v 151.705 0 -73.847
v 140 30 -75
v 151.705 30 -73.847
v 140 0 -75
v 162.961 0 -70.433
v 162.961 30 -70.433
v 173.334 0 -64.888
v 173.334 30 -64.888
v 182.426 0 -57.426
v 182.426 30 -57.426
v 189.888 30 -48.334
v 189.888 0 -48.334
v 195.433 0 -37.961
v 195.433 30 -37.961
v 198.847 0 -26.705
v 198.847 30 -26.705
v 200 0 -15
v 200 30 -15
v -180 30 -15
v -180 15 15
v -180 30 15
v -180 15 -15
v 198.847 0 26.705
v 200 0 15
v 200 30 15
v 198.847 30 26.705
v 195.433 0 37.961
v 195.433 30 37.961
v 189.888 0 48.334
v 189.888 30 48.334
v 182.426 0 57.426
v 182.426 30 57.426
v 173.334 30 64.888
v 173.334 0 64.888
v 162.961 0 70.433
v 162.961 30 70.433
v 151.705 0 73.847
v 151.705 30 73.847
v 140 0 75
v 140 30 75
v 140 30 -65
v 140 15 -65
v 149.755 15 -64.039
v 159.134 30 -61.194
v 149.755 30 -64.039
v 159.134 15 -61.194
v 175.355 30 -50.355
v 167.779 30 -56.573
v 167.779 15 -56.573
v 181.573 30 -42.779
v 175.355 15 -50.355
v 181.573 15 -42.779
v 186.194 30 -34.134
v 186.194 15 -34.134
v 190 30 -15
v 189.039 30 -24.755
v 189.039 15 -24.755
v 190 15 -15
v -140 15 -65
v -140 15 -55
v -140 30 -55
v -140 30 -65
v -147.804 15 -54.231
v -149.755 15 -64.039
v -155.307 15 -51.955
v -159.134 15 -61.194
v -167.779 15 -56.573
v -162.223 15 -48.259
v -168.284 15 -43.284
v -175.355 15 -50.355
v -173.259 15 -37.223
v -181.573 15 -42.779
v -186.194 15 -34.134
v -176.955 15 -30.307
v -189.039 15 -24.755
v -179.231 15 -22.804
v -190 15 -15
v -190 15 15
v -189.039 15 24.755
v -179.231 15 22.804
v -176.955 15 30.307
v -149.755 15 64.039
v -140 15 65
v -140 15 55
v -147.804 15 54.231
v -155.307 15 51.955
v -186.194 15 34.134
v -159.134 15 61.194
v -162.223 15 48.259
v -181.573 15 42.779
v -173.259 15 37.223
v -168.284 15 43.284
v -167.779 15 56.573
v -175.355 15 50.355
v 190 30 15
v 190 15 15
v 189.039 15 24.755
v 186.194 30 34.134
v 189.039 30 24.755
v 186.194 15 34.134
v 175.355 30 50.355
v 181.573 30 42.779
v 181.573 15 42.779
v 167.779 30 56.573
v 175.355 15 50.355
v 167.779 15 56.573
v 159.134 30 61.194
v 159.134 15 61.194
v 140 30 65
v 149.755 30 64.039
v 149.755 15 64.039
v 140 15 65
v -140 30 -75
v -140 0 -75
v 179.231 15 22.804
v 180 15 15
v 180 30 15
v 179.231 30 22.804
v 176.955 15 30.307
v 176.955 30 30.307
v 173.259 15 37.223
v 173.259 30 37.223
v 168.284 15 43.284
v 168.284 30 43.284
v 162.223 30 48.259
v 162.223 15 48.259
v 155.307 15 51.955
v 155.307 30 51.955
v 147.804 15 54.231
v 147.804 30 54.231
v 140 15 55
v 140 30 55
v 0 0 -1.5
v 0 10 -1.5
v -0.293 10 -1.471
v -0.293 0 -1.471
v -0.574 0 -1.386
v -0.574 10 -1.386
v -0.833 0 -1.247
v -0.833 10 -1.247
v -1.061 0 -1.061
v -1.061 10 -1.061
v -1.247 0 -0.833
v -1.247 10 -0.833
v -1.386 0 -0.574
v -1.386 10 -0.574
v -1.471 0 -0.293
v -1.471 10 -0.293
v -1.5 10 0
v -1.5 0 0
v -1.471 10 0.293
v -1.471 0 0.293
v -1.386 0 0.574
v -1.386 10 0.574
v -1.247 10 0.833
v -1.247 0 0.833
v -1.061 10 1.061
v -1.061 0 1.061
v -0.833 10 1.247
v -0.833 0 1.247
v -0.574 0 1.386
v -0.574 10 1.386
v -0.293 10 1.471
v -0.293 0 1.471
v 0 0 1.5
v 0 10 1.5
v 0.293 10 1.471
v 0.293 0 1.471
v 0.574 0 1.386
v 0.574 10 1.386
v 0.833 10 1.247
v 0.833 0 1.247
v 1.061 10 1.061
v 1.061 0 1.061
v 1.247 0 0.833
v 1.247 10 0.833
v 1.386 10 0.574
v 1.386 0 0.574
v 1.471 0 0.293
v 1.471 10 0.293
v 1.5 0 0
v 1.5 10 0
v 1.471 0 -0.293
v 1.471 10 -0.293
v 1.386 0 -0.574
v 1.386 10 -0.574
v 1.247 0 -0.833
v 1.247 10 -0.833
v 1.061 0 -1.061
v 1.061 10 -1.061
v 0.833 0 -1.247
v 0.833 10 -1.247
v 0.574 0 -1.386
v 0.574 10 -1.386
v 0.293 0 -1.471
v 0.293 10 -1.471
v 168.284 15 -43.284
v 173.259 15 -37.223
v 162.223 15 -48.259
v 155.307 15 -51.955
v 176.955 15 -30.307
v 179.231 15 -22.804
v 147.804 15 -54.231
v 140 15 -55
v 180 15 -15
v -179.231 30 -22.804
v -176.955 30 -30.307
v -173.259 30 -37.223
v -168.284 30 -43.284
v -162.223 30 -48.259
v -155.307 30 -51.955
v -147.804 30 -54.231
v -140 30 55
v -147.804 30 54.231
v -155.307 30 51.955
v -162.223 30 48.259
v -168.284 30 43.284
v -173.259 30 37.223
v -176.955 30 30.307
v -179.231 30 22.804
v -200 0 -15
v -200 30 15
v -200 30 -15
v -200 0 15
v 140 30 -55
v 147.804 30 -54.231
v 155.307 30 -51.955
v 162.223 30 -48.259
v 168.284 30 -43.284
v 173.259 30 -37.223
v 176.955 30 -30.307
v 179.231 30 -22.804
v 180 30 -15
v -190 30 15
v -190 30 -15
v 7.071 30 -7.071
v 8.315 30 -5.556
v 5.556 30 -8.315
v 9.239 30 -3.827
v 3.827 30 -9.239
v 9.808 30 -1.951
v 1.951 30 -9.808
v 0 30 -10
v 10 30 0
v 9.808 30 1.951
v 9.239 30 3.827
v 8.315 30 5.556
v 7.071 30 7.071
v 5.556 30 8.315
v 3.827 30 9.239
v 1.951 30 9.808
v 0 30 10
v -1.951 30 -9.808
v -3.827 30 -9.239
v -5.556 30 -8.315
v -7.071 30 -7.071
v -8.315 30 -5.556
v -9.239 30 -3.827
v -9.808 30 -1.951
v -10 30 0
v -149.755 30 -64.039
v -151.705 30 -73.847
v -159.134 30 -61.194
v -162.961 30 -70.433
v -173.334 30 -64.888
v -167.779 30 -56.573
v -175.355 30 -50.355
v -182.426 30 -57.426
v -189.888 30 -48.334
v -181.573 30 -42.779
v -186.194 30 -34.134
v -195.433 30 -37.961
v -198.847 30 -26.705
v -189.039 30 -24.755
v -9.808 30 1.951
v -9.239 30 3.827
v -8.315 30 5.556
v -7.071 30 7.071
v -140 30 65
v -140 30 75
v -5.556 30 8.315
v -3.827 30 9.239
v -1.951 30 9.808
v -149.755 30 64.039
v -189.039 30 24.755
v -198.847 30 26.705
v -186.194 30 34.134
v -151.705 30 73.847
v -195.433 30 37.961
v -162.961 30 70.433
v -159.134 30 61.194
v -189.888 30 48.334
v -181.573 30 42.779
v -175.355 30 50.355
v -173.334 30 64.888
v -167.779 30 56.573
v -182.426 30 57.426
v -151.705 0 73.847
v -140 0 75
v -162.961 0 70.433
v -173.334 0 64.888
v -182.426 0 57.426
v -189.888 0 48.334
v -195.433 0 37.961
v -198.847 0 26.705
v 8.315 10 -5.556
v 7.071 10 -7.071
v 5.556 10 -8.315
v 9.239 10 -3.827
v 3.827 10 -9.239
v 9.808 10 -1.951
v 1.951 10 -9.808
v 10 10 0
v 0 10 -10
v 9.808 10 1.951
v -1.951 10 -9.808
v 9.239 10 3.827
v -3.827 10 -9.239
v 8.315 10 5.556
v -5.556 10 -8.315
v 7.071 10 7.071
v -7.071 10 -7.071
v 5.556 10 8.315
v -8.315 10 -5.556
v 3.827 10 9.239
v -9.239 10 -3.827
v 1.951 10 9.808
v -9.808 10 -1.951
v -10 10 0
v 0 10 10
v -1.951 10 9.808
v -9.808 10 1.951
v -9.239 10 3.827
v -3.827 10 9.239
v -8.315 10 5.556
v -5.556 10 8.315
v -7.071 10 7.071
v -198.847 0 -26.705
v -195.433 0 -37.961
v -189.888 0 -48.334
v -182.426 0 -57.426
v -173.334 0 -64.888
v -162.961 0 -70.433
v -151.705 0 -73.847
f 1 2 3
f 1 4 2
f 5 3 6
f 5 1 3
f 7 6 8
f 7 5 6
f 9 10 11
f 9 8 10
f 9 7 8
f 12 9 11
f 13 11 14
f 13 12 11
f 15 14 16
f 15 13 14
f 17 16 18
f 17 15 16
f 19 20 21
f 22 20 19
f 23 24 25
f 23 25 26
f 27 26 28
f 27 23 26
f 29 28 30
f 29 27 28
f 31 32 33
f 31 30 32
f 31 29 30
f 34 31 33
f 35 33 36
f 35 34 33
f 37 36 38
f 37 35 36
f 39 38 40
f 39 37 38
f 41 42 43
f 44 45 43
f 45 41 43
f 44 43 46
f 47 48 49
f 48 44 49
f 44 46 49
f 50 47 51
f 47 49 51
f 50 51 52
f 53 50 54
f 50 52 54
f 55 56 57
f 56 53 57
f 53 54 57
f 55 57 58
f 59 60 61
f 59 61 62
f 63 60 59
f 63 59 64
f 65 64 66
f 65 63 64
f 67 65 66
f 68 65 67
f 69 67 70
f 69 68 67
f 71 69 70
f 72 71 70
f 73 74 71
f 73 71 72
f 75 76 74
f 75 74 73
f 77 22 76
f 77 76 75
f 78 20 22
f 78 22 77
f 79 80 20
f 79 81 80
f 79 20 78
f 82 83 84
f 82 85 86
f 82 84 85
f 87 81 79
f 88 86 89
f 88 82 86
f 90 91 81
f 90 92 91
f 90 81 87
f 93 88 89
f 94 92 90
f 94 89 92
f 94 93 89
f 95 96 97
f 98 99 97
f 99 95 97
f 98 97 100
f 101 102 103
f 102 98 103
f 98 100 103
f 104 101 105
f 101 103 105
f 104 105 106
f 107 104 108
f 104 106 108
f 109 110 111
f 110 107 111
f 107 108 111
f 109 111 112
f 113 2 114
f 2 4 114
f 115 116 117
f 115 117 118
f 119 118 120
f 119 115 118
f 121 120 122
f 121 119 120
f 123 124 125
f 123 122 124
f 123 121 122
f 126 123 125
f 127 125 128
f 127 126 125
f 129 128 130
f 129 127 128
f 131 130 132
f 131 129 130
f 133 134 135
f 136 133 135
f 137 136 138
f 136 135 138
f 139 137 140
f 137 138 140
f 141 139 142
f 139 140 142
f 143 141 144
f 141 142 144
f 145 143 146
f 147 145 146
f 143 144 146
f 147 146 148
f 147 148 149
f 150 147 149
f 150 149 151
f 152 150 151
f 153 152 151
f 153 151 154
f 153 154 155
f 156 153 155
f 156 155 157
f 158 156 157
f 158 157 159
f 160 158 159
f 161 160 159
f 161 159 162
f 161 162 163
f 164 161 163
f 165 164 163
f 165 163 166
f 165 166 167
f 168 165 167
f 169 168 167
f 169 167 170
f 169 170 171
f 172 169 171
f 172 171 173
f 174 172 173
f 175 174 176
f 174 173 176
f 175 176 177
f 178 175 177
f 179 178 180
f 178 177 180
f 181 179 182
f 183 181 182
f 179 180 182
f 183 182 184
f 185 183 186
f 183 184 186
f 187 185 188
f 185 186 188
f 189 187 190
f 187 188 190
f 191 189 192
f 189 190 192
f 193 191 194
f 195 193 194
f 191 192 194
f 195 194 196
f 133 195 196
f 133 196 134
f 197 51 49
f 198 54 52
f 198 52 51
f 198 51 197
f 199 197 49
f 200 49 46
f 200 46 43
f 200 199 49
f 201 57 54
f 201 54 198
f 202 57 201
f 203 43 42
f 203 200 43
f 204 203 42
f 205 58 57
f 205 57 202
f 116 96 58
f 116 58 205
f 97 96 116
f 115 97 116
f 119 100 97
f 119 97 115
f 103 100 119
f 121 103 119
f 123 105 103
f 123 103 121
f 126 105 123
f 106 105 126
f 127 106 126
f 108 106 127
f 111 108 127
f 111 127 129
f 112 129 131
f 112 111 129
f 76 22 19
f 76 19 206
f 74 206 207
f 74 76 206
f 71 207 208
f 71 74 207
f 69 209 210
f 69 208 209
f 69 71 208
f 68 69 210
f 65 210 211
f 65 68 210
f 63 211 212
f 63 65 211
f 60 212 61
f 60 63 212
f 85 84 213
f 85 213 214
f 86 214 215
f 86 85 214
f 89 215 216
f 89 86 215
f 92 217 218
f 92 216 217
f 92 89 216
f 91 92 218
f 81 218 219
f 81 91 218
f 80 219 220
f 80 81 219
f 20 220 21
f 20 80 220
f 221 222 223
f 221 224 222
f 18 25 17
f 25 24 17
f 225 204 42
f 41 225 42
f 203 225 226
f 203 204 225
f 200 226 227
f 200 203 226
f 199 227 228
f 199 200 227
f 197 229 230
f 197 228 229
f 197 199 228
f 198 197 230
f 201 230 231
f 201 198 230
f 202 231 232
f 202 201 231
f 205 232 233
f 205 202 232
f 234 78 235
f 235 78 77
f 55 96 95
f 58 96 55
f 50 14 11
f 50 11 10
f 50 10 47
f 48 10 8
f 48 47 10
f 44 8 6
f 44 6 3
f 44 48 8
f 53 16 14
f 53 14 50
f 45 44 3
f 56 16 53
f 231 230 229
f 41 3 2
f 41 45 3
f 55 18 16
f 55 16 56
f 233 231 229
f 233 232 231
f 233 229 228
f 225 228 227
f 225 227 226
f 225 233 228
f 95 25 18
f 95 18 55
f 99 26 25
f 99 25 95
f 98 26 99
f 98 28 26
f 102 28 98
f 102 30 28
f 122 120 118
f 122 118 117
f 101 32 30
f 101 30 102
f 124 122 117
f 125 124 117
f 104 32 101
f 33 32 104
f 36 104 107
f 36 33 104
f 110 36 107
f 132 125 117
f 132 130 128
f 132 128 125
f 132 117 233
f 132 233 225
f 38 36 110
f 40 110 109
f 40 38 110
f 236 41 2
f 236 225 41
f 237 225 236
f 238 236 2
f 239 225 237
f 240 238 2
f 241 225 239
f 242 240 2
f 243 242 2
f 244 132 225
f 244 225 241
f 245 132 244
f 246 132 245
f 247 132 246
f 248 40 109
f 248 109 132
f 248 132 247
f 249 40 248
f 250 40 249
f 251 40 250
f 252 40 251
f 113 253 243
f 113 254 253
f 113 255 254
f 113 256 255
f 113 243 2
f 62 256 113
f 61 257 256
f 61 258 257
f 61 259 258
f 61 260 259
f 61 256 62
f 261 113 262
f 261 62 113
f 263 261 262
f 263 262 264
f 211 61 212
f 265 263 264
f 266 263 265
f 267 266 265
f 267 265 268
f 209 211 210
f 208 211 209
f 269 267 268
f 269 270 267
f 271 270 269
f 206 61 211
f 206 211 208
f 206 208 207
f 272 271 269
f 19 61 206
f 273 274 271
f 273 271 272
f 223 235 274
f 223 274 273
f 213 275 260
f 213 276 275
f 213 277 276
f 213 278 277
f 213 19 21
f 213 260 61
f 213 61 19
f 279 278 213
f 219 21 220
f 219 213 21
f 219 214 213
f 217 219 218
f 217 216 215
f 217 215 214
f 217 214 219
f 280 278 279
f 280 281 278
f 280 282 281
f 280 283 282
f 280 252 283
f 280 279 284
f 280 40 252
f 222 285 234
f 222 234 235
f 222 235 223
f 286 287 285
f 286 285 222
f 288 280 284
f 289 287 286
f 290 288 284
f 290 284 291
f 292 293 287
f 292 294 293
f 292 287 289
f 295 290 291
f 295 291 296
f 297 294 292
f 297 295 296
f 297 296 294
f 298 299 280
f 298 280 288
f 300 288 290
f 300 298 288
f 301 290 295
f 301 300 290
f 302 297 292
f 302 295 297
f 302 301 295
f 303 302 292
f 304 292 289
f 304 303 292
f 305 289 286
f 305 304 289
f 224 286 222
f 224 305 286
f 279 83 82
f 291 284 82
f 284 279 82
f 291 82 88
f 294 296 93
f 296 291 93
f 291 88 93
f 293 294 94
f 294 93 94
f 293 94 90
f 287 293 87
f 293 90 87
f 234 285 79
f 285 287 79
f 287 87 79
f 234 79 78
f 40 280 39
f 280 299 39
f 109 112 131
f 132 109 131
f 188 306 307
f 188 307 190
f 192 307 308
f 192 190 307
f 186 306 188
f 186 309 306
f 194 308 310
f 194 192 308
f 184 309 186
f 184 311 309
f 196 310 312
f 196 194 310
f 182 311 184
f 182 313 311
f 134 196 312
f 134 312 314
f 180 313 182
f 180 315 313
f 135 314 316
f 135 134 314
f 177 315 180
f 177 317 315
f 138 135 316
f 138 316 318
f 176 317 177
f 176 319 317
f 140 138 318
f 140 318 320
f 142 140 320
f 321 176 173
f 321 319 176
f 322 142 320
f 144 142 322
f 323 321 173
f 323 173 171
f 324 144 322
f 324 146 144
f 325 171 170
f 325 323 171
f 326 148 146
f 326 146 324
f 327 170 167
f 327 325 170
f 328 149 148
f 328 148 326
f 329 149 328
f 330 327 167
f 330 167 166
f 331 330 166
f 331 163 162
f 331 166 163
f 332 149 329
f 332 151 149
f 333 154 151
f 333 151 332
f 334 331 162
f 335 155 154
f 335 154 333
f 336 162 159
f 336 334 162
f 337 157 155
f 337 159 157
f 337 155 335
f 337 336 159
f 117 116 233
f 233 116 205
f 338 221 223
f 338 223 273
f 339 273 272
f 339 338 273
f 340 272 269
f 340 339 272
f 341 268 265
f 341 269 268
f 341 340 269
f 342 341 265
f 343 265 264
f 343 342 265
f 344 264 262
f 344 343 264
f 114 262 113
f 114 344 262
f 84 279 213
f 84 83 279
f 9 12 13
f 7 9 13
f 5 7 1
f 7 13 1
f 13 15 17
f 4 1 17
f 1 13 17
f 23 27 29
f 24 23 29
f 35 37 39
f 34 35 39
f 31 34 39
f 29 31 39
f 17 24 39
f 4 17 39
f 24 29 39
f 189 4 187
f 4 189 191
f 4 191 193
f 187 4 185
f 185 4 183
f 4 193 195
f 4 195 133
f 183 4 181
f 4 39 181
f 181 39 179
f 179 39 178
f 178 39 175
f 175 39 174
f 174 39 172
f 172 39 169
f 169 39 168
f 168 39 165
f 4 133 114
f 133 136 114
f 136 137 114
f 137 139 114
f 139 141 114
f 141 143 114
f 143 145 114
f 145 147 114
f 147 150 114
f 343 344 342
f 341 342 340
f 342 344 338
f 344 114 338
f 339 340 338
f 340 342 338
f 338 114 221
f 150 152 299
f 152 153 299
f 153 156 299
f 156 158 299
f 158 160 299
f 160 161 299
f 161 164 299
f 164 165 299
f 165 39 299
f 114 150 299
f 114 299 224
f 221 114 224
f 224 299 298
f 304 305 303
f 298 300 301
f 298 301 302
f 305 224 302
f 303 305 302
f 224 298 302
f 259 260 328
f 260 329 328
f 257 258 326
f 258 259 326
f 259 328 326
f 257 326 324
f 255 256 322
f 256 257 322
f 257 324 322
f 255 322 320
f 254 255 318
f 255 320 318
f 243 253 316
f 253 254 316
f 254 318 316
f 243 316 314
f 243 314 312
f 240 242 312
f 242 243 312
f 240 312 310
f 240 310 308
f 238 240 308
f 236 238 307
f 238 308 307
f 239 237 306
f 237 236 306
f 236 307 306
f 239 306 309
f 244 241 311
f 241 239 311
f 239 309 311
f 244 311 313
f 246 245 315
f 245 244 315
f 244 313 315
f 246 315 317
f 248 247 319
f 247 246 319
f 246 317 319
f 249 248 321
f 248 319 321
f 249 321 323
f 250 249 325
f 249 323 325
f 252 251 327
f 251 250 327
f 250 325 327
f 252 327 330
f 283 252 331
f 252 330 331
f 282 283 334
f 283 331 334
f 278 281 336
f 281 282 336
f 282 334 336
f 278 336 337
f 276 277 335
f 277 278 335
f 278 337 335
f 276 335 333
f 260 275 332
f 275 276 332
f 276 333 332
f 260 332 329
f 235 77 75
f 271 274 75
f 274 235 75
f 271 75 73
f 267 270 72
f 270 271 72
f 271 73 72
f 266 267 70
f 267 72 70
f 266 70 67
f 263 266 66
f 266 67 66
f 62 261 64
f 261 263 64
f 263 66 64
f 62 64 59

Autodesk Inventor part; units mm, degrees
ref_plane "YZ Plane" through (0, 0, 0) normal (1, 0, 0) x (0, 1, 0)
ref_plane "XZ Plane" through (0, 0, 0) normal (0, 1, 0) x (-1, 0, 0)
ref_plane "XY Plane" through (0, 0, 0) normal (0, 0, 1) x (1, 0, 0)
sketch "Boceto1" plane through (0, 0, 0) normal (0, 1, 0) x (-1, 0, 0)
  line L0 (140, 75) -> (-140, 75)
  line L1 (-200, 15) -> (-200, -15)
  line L2 (-140, -75) -> (140, -75)
  arc A0 (-140, 75) -> (-200, 15) centre (-140, 15) ccw
  arc A1 (-200, -15) -> (-140, -75) centre (-140, -15) ccw
  line L3 (-140, 65) -> (-140, 55)
  line L4 (-140, -55) -> (-140, -65)
  arc A2 (-140, 65) -> (-190, 15) centre (-140, 15) ccw
  line L5 (-190, 15) -> (-190, -15)
  arc A3 (-190, -15) -> (-140, -65) centre (-140, -15) ccw
  arc A4 (-140, 55) -> (-180, 15) centre (-140, 15) ccw
  line L6 (-180, 15) -> (-180, -15)
  arc A5 (-180, -15) -> (-140, -55) centre (-140, -15) ccw
  line L7 (140, 65) -> (140, 55)
  line L8 (140, -55) -> (140, -65)
  arc A6 (190, 15) -> (140, 65) centre (140, 15) ccw
  line L9 (190, 15) -> (190, -15)
  arc A7 (140, -65) -> (190, -15) centre (140, -15) ccw
  arc A8 (180, 15) -> (140, 55) centre (140, 15) ccw
  line L10 (180, 15) -> (180, -15)
  arc A9 (140, -55) -> (180, -15) centre (140, -15) ccw
  line L11 (200, 15) -> (200, -15)
  arc A10 (200, 15) -> (140, 75) centre (140, 15) ccw
  arc A11 (140, -75) -> (200, -15) centre (140, -15) ccw
  circle A12 centre (0, 0) radius 10
  dimension "d32" = 400
  dimension "d33" = 150
extrude "Extrusión1" add sketch "Boceto1" along normal blind 15 contours A6 L9 A7 L8 A9 L10 A8 L7
extrude "Extrusión2" add sketch "Boceto1" along normal blind 15 contours L3 A4 L6 A5 L4 A3 L5 A2
extrude "Extrusión3" add sketch "Boceto1" along normal blind 30
extrude "Extrusión4" add sketch "Boceto1" along normal blind 10 contours A12
hole "Agujero1" at (0, 0, 0) direction (0, 1, 0) diameter 3 end through all
properties part number "base"
